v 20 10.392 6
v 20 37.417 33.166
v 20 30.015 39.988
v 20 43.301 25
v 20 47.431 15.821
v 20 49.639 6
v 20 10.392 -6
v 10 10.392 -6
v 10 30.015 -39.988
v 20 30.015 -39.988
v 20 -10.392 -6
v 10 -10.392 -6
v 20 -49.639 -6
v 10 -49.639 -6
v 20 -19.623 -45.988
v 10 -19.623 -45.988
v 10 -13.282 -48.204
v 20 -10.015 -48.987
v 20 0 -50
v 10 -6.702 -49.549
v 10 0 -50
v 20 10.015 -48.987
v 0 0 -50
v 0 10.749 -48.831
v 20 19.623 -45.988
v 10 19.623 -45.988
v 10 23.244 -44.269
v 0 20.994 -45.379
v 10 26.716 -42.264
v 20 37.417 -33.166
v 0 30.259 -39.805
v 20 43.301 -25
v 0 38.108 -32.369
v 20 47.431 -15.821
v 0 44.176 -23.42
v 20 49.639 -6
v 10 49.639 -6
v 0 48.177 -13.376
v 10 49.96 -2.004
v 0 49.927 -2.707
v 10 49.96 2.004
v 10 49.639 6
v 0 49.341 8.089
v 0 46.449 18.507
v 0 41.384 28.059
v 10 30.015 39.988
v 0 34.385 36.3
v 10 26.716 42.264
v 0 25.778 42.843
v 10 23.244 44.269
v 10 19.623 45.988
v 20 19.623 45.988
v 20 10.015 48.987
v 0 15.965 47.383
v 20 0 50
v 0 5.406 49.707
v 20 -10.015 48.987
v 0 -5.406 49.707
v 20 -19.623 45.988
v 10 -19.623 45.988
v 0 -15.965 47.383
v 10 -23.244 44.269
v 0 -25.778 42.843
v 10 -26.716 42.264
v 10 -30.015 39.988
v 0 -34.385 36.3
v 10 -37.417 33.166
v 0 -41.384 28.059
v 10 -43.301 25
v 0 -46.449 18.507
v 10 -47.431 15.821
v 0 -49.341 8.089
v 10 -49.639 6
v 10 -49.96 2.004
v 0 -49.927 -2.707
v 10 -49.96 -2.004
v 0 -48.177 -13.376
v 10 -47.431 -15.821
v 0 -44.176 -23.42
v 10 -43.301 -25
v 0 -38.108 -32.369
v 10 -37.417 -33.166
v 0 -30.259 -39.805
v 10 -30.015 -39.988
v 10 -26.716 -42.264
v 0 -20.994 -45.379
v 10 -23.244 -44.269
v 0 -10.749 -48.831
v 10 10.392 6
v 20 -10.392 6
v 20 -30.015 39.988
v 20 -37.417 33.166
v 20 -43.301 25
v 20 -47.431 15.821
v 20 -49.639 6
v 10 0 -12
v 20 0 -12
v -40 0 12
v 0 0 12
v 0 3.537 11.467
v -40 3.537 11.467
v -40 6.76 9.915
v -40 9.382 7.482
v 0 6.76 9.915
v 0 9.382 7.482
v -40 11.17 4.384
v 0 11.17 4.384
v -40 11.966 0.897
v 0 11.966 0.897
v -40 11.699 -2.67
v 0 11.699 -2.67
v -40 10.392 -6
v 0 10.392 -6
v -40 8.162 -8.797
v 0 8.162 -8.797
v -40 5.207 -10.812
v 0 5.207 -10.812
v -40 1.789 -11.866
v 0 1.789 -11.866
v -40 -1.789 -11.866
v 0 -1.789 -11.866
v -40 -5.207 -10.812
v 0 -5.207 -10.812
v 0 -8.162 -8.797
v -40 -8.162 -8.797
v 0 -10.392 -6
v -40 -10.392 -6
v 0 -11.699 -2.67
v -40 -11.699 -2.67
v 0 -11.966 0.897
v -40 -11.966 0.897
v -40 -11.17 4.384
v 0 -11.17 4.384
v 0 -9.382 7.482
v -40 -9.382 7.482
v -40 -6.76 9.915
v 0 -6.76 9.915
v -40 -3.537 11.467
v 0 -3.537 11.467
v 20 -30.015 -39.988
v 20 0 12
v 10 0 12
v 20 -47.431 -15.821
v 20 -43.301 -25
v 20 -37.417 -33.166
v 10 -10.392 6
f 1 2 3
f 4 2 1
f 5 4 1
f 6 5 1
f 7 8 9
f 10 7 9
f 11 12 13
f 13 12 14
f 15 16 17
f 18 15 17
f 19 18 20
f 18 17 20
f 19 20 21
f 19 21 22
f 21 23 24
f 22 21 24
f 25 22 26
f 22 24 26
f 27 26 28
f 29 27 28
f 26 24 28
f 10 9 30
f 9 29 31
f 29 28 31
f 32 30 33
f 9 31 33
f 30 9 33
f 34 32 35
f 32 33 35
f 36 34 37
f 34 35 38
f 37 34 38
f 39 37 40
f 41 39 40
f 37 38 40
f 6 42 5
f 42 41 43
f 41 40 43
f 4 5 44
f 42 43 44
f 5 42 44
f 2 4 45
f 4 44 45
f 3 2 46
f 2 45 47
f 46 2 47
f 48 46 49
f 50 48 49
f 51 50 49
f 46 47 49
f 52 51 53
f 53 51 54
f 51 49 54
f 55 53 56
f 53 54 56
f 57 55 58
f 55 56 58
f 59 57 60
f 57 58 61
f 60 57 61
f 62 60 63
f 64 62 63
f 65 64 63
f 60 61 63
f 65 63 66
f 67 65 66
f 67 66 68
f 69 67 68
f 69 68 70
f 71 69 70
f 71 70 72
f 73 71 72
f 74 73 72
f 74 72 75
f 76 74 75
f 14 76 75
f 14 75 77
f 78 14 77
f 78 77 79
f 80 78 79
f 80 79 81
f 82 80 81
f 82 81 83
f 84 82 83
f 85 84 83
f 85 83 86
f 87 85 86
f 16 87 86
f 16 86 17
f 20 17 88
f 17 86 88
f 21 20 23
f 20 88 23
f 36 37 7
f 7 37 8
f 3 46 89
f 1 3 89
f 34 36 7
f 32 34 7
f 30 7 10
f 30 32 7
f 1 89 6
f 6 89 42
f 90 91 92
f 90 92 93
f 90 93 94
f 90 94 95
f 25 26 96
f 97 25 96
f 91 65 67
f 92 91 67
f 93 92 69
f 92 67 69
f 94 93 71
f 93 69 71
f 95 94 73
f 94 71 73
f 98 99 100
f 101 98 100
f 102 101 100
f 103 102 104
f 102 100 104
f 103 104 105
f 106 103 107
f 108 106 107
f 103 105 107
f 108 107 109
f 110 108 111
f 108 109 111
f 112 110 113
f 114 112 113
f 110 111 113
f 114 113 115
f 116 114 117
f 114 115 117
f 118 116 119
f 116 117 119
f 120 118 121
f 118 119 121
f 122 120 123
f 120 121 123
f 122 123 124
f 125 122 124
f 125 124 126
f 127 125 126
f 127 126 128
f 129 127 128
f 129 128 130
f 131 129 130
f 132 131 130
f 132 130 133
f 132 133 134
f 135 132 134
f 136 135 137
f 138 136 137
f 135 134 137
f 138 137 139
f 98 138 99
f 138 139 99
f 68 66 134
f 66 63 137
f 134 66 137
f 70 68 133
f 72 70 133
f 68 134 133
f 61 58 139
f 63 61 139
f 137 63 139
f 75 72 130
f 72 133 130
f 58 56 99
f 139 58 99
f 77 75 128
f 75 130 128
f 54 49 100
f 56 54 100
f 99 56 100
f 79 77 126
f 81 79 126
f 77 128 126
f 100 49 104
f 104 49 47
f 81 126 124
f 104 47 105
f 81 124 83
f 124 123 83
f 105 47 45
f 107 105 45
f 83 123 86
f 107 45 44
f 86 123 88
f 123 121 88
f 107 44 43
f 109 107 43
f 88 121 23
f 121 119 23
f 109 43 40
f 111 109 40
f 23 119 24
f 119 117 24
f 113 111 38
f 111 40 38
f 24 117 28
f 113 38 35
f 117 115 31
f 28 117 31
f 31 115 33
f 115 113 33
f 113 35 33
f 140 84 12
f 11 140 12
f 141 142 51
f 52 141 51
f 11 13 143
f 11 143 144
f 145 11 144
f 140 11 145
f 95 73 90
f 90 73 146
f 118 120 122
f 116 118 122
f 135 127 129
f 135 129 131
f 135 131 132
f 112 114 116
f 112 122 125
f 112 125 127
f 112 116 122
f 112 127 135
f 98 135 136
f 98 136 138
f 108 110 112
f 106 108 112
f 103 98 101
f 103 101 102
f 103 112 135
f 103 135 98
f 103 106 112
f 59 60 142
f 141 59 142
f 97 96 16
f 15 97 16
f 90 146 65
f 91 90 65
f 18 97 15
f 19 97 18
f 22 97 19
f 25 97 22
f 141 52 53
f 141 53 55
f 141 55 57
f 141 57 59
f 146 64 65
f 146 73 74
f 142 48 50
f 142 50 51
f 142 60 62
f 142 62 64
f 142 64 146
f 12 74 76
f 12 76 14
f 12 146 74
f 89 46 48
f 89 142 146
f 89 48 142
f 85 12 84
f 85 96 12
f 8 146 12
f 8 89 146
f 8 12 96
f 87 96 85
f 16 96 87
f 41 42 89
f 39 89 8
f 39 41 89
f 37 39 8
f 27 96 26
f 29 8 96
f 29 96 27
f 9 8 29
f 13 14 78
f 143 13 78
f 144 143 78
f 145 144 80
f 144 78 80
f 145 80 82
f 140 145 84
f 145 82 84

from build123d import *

# Parameters (mm, degrees)
SKETCH1_R           = 50
BOSS_EXTRUDE1_DEPTH = 10
BOSS_EXTRUDE2_DEPTH = 10
SKETCH9_R           = 12
BOSS_EXTRUDE3_DEPTH = 40


with BuildPart() as part:
    # Sketch1 → Boss-Extrude1 (new body)
    with BuildSketch(Plane(origin=(0, 0, 0), x_dir=(0, 0, -1), z_dir=(1, 0, 0))):
        Circle(SKETCH1_R)
    extrude(amount=BOSS_EXTRUDE1_DEPTH)

    # Sketch7 → Boss-Extrude2 (add)
    with BuildSketch(Plane(origin=(10, 0, 0), x_dir=(0, 0, -1), z_dir=(1, 0, 0))):
        with BuildLine():
            Line((12, 0), (45.98837052, -19.623194869))
            ThreePointArc((45.98837052, -19.623194869), (50, 0), (45.98837052, 19.623194869))
            Line((45.98837052, 19.623194869), (12, 0))
        make_face()
        with BuildLine():
            Line((6, -10.392304845), (6, -49.638694584))
            ThreePointArc((6, -49.638694584), (25, -43.301270189), (39.98837052, -30.015499715))
            Line((39.98837052, -30.015499715), (6, -10.392304845))
        make_face()
        with BuildLine():
            Line((6, 10.392304845), (39.98837052, 30.015499715))
            ThreePointArc((39.98837052, 30.015499715), (25, 43.301270189), (6, 49.638694584))
            Line((6, 49.638694584), (6, 10.392304845))
        make_face()
        with BuildLine():
            Line((-6, -10.392304845), (-39.98837052, -30.015499715))
            ThreePointArc((-39.98837052, -30.015499715), (-25, -43.301270189), (-6, -49.638694584))
            Line((-6, -49.638694584), (-6, -10.392304845))
        make_face()
        with BuildLine():
            Line((-12, 0), (-45.98837052, 19.623194869))
            ThreePointArc((-45.98837052, 19.623194869), (-50, 0), (-45.98837052, -19.623194869))
            Line((-45.98837052, -19.623194869), (-12, 0))
        make_face()
        with BuildLine():
            Line((-6, 10.392304845), (-6, 49.638694584))
            ThreePointArc((-6, 49.638694584), (-25, 43.301270189), (-39.98837052, 30.015499715))
            Line((-39.98837052, 30.015499715), (-6, 10.392304845))
        make_face()
    extrude(amount=BOSS_EXTRUDE2_DEPTH)

    # Sketch9 → Boss-Extrude3 (add)
    with BuildSketch(Plane.ZY):
        Circle(SKETCH9_R)
    extrude(amount=BOSS_EXTRUDE3_DEPTH)


solid = part.part
